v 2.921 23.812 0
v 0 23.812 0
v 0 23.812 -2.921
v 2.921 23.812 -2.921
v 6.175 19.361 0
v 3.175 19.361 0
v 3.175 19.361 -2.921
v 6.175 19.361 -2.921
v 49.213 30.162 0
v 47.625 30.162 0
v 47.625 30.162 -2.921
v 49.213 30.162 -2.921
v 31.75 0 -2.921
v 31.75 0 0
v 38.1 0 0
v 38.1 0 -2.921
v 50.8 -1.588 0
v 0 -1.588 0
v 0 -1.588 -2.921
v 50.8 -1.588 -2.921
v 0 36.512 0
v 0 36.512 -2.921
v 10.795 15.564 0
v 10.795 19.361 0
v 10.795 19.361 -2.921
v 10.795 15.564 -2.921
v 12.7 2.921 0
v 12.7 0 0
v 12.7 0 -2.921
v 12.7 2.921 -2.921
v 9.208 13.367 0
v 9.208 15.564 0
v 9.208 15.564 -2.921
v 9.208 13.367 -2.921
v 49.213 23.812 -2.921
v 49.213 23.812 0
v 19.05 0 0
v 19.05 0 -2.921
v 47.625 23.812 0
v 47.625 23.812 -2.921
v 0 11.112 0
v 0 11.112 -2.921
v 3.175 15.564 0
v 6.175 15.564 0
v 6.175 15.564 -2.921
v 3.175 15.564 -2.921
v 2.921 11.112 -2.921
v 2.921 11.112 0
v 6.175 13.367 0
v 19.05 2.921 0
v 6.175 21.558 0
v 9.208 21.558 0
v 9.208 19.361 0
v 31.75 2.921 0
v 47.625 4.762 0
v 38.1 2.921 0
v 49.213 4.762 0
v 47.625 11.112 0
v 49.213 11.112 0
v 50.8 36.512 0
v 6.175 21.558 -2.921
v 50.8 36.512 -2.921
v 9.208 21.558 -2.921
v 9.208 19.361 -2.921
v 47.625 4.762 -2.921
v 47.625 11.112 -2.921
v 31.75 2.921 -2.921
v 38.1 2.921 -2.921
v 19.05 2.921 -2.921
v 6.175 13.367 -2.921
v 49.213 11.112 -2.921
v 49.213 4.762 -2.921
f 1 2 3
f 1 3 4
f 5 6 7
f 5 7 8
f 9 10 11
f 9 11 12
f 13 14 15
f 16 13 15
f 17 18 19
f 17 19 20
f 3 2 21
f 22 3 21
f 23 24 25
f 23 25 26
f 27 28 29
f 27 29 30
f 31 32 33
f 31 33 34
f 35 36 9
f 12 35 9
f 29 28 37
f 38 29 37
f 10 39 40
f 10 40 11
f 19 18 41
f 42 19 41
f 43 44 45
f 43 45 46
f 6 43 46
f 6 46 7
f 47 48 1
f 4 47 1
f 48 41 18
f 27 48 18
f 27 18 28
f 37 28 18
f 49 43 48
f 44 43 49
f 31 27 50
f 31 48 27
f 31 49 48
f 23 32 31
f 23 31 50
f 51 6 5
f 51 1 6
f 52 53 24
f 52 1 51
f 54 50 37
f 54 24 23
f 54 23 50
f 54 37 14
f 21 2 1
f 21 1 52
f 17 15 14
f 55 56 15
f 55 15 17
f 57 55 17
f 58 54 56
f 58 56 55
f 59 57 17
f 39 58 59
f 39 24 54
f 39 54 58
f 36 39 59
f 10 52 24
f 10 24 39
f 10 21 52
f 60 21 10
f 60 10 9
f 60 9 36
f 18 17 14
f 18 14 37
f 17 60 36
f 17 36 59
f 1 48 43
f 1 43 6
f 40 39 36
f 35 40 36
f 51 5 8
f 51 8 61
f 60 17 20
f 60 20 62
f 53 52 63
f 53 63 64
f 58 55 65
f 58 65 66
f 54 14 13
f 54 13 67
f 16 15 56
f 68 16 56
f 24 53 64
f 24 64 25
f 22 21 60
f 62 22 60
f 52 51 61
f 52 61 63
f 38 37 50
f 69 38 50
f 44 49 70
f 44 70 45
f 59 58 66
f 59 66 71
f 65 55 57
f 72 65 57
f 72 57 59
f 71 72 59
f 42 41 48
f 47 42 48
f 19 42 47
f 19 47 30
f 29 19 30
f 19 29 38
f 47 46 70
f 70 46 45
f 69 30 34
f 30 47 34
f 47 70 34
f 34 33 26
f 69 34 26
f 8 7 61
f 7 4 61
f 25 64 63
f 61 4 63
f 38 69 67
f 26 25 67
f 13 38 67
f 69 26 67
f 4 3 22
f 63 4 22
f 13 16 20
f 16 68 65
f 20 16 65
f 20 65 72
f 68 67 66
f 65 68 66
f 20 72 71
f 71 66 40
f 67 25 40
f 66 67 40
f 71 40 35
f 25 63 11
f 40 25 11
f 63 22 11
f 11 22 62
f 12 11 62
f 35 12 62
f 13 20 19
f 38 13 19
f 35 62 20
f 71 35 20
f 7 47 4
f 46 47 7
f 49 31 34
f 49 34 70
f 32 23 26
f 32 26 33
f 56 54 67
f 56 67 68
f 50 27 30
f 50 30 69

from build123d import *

# Parameters (mm, degrees)
SKETCH1_W           = 50.8
SKETCH1_H           = 38.1
BOSS_EXTRUDE1_DEPTH = 2.921
SKETCH2_W           = 6.35
SKETCH2_H           = 2.921
CUT_EXTRUDE1_DEPTH  = 63.628546983
SKETCH3_W           = 7.355919967
SKETCH3_H           = 12.7
CUT_EXTRUDE2_DEPTH  = 63.628546983
CUT_EXTRUDE3_DEPTH  = 63.628546983
SKETCH5_W           = 1.5875
SKETCH5_H           = 6.35
CUT_EXTRUDE4_DEPTH  = 63.628546983


with BuildPart() as part:
    # Sketch1 → Boss-Extrude1 (new body)
    with BuildSketch(Plane.XY):
        with Locations((25.4, 17.4625)):
            Rectangle(SKETCH1_W, SKETCH1_H)
    extrude(amount=-BOSS_EXTRUDE1_DEPTH)

    # Sketch2 → Cut-Extrude1 (cut, through all)
    with BuildSketch(Plane.XY):
        with Locations((15.875, 1.4605)):
            Rectangle(SKETCH2_W, SKETCH2_H)
        with Locations((34.925, 1.4605)):
            Rectangle(SKETCH2_W, SKETCH2_H)
    extrude(amount=-CUT_EXTRUDE1_DEPTH, mode=Mode.SUBTRACT)

    # Sketch3 → Cut-Extrude2 (cut, through all)
    with BuildSketch(Plane.XY):
        with Locations((-0.756959983, 17.4625)):
            Rectangle(SKETCH3_W, SKETCH3_H)
    extrude(amount=-CUT_EXTRUDE2_DEPTH, mode=Mode.SUBTRACT)

    # Sketch4 → Cut-Extrude3 (cut, through all)
    with BuildSketch(Plane.XY):
        Polygon((3.175, 19.36115), (6.175375, 19.36115), (6.175375, 21.55825), (9.2075, 21.55825), (9.2075, 19.36115), (10.795, 19.36115), (10.795, 15.56385), (9.2075, 15.56385), (9.2075, 13.36675), (6.175375, 13.36675), (6.175375, 15.56385), (3.175, 15.56385), align=None)
    extrude(amount=-CUT_EXTRUDE3_DEPTH, mode=Mode.SUBTRACT)

    # Sketch5 → Cut-Extrude4 (cut, through all)
    with BuildSketch(Plane.XY):
        with Locations((48.41875, 26.9875)):
            Rectangle(SKETCH5_W, SKETCH5_H)
        with Locations((48.41875, 7.9375)):
            Rectangle(SKETCH5_W, SKETCH5_H)
    extrude(amount=-CUT_EXTRUDE4_DEPTH, mode=Mode.SUBTRACT)


solid = part.part
